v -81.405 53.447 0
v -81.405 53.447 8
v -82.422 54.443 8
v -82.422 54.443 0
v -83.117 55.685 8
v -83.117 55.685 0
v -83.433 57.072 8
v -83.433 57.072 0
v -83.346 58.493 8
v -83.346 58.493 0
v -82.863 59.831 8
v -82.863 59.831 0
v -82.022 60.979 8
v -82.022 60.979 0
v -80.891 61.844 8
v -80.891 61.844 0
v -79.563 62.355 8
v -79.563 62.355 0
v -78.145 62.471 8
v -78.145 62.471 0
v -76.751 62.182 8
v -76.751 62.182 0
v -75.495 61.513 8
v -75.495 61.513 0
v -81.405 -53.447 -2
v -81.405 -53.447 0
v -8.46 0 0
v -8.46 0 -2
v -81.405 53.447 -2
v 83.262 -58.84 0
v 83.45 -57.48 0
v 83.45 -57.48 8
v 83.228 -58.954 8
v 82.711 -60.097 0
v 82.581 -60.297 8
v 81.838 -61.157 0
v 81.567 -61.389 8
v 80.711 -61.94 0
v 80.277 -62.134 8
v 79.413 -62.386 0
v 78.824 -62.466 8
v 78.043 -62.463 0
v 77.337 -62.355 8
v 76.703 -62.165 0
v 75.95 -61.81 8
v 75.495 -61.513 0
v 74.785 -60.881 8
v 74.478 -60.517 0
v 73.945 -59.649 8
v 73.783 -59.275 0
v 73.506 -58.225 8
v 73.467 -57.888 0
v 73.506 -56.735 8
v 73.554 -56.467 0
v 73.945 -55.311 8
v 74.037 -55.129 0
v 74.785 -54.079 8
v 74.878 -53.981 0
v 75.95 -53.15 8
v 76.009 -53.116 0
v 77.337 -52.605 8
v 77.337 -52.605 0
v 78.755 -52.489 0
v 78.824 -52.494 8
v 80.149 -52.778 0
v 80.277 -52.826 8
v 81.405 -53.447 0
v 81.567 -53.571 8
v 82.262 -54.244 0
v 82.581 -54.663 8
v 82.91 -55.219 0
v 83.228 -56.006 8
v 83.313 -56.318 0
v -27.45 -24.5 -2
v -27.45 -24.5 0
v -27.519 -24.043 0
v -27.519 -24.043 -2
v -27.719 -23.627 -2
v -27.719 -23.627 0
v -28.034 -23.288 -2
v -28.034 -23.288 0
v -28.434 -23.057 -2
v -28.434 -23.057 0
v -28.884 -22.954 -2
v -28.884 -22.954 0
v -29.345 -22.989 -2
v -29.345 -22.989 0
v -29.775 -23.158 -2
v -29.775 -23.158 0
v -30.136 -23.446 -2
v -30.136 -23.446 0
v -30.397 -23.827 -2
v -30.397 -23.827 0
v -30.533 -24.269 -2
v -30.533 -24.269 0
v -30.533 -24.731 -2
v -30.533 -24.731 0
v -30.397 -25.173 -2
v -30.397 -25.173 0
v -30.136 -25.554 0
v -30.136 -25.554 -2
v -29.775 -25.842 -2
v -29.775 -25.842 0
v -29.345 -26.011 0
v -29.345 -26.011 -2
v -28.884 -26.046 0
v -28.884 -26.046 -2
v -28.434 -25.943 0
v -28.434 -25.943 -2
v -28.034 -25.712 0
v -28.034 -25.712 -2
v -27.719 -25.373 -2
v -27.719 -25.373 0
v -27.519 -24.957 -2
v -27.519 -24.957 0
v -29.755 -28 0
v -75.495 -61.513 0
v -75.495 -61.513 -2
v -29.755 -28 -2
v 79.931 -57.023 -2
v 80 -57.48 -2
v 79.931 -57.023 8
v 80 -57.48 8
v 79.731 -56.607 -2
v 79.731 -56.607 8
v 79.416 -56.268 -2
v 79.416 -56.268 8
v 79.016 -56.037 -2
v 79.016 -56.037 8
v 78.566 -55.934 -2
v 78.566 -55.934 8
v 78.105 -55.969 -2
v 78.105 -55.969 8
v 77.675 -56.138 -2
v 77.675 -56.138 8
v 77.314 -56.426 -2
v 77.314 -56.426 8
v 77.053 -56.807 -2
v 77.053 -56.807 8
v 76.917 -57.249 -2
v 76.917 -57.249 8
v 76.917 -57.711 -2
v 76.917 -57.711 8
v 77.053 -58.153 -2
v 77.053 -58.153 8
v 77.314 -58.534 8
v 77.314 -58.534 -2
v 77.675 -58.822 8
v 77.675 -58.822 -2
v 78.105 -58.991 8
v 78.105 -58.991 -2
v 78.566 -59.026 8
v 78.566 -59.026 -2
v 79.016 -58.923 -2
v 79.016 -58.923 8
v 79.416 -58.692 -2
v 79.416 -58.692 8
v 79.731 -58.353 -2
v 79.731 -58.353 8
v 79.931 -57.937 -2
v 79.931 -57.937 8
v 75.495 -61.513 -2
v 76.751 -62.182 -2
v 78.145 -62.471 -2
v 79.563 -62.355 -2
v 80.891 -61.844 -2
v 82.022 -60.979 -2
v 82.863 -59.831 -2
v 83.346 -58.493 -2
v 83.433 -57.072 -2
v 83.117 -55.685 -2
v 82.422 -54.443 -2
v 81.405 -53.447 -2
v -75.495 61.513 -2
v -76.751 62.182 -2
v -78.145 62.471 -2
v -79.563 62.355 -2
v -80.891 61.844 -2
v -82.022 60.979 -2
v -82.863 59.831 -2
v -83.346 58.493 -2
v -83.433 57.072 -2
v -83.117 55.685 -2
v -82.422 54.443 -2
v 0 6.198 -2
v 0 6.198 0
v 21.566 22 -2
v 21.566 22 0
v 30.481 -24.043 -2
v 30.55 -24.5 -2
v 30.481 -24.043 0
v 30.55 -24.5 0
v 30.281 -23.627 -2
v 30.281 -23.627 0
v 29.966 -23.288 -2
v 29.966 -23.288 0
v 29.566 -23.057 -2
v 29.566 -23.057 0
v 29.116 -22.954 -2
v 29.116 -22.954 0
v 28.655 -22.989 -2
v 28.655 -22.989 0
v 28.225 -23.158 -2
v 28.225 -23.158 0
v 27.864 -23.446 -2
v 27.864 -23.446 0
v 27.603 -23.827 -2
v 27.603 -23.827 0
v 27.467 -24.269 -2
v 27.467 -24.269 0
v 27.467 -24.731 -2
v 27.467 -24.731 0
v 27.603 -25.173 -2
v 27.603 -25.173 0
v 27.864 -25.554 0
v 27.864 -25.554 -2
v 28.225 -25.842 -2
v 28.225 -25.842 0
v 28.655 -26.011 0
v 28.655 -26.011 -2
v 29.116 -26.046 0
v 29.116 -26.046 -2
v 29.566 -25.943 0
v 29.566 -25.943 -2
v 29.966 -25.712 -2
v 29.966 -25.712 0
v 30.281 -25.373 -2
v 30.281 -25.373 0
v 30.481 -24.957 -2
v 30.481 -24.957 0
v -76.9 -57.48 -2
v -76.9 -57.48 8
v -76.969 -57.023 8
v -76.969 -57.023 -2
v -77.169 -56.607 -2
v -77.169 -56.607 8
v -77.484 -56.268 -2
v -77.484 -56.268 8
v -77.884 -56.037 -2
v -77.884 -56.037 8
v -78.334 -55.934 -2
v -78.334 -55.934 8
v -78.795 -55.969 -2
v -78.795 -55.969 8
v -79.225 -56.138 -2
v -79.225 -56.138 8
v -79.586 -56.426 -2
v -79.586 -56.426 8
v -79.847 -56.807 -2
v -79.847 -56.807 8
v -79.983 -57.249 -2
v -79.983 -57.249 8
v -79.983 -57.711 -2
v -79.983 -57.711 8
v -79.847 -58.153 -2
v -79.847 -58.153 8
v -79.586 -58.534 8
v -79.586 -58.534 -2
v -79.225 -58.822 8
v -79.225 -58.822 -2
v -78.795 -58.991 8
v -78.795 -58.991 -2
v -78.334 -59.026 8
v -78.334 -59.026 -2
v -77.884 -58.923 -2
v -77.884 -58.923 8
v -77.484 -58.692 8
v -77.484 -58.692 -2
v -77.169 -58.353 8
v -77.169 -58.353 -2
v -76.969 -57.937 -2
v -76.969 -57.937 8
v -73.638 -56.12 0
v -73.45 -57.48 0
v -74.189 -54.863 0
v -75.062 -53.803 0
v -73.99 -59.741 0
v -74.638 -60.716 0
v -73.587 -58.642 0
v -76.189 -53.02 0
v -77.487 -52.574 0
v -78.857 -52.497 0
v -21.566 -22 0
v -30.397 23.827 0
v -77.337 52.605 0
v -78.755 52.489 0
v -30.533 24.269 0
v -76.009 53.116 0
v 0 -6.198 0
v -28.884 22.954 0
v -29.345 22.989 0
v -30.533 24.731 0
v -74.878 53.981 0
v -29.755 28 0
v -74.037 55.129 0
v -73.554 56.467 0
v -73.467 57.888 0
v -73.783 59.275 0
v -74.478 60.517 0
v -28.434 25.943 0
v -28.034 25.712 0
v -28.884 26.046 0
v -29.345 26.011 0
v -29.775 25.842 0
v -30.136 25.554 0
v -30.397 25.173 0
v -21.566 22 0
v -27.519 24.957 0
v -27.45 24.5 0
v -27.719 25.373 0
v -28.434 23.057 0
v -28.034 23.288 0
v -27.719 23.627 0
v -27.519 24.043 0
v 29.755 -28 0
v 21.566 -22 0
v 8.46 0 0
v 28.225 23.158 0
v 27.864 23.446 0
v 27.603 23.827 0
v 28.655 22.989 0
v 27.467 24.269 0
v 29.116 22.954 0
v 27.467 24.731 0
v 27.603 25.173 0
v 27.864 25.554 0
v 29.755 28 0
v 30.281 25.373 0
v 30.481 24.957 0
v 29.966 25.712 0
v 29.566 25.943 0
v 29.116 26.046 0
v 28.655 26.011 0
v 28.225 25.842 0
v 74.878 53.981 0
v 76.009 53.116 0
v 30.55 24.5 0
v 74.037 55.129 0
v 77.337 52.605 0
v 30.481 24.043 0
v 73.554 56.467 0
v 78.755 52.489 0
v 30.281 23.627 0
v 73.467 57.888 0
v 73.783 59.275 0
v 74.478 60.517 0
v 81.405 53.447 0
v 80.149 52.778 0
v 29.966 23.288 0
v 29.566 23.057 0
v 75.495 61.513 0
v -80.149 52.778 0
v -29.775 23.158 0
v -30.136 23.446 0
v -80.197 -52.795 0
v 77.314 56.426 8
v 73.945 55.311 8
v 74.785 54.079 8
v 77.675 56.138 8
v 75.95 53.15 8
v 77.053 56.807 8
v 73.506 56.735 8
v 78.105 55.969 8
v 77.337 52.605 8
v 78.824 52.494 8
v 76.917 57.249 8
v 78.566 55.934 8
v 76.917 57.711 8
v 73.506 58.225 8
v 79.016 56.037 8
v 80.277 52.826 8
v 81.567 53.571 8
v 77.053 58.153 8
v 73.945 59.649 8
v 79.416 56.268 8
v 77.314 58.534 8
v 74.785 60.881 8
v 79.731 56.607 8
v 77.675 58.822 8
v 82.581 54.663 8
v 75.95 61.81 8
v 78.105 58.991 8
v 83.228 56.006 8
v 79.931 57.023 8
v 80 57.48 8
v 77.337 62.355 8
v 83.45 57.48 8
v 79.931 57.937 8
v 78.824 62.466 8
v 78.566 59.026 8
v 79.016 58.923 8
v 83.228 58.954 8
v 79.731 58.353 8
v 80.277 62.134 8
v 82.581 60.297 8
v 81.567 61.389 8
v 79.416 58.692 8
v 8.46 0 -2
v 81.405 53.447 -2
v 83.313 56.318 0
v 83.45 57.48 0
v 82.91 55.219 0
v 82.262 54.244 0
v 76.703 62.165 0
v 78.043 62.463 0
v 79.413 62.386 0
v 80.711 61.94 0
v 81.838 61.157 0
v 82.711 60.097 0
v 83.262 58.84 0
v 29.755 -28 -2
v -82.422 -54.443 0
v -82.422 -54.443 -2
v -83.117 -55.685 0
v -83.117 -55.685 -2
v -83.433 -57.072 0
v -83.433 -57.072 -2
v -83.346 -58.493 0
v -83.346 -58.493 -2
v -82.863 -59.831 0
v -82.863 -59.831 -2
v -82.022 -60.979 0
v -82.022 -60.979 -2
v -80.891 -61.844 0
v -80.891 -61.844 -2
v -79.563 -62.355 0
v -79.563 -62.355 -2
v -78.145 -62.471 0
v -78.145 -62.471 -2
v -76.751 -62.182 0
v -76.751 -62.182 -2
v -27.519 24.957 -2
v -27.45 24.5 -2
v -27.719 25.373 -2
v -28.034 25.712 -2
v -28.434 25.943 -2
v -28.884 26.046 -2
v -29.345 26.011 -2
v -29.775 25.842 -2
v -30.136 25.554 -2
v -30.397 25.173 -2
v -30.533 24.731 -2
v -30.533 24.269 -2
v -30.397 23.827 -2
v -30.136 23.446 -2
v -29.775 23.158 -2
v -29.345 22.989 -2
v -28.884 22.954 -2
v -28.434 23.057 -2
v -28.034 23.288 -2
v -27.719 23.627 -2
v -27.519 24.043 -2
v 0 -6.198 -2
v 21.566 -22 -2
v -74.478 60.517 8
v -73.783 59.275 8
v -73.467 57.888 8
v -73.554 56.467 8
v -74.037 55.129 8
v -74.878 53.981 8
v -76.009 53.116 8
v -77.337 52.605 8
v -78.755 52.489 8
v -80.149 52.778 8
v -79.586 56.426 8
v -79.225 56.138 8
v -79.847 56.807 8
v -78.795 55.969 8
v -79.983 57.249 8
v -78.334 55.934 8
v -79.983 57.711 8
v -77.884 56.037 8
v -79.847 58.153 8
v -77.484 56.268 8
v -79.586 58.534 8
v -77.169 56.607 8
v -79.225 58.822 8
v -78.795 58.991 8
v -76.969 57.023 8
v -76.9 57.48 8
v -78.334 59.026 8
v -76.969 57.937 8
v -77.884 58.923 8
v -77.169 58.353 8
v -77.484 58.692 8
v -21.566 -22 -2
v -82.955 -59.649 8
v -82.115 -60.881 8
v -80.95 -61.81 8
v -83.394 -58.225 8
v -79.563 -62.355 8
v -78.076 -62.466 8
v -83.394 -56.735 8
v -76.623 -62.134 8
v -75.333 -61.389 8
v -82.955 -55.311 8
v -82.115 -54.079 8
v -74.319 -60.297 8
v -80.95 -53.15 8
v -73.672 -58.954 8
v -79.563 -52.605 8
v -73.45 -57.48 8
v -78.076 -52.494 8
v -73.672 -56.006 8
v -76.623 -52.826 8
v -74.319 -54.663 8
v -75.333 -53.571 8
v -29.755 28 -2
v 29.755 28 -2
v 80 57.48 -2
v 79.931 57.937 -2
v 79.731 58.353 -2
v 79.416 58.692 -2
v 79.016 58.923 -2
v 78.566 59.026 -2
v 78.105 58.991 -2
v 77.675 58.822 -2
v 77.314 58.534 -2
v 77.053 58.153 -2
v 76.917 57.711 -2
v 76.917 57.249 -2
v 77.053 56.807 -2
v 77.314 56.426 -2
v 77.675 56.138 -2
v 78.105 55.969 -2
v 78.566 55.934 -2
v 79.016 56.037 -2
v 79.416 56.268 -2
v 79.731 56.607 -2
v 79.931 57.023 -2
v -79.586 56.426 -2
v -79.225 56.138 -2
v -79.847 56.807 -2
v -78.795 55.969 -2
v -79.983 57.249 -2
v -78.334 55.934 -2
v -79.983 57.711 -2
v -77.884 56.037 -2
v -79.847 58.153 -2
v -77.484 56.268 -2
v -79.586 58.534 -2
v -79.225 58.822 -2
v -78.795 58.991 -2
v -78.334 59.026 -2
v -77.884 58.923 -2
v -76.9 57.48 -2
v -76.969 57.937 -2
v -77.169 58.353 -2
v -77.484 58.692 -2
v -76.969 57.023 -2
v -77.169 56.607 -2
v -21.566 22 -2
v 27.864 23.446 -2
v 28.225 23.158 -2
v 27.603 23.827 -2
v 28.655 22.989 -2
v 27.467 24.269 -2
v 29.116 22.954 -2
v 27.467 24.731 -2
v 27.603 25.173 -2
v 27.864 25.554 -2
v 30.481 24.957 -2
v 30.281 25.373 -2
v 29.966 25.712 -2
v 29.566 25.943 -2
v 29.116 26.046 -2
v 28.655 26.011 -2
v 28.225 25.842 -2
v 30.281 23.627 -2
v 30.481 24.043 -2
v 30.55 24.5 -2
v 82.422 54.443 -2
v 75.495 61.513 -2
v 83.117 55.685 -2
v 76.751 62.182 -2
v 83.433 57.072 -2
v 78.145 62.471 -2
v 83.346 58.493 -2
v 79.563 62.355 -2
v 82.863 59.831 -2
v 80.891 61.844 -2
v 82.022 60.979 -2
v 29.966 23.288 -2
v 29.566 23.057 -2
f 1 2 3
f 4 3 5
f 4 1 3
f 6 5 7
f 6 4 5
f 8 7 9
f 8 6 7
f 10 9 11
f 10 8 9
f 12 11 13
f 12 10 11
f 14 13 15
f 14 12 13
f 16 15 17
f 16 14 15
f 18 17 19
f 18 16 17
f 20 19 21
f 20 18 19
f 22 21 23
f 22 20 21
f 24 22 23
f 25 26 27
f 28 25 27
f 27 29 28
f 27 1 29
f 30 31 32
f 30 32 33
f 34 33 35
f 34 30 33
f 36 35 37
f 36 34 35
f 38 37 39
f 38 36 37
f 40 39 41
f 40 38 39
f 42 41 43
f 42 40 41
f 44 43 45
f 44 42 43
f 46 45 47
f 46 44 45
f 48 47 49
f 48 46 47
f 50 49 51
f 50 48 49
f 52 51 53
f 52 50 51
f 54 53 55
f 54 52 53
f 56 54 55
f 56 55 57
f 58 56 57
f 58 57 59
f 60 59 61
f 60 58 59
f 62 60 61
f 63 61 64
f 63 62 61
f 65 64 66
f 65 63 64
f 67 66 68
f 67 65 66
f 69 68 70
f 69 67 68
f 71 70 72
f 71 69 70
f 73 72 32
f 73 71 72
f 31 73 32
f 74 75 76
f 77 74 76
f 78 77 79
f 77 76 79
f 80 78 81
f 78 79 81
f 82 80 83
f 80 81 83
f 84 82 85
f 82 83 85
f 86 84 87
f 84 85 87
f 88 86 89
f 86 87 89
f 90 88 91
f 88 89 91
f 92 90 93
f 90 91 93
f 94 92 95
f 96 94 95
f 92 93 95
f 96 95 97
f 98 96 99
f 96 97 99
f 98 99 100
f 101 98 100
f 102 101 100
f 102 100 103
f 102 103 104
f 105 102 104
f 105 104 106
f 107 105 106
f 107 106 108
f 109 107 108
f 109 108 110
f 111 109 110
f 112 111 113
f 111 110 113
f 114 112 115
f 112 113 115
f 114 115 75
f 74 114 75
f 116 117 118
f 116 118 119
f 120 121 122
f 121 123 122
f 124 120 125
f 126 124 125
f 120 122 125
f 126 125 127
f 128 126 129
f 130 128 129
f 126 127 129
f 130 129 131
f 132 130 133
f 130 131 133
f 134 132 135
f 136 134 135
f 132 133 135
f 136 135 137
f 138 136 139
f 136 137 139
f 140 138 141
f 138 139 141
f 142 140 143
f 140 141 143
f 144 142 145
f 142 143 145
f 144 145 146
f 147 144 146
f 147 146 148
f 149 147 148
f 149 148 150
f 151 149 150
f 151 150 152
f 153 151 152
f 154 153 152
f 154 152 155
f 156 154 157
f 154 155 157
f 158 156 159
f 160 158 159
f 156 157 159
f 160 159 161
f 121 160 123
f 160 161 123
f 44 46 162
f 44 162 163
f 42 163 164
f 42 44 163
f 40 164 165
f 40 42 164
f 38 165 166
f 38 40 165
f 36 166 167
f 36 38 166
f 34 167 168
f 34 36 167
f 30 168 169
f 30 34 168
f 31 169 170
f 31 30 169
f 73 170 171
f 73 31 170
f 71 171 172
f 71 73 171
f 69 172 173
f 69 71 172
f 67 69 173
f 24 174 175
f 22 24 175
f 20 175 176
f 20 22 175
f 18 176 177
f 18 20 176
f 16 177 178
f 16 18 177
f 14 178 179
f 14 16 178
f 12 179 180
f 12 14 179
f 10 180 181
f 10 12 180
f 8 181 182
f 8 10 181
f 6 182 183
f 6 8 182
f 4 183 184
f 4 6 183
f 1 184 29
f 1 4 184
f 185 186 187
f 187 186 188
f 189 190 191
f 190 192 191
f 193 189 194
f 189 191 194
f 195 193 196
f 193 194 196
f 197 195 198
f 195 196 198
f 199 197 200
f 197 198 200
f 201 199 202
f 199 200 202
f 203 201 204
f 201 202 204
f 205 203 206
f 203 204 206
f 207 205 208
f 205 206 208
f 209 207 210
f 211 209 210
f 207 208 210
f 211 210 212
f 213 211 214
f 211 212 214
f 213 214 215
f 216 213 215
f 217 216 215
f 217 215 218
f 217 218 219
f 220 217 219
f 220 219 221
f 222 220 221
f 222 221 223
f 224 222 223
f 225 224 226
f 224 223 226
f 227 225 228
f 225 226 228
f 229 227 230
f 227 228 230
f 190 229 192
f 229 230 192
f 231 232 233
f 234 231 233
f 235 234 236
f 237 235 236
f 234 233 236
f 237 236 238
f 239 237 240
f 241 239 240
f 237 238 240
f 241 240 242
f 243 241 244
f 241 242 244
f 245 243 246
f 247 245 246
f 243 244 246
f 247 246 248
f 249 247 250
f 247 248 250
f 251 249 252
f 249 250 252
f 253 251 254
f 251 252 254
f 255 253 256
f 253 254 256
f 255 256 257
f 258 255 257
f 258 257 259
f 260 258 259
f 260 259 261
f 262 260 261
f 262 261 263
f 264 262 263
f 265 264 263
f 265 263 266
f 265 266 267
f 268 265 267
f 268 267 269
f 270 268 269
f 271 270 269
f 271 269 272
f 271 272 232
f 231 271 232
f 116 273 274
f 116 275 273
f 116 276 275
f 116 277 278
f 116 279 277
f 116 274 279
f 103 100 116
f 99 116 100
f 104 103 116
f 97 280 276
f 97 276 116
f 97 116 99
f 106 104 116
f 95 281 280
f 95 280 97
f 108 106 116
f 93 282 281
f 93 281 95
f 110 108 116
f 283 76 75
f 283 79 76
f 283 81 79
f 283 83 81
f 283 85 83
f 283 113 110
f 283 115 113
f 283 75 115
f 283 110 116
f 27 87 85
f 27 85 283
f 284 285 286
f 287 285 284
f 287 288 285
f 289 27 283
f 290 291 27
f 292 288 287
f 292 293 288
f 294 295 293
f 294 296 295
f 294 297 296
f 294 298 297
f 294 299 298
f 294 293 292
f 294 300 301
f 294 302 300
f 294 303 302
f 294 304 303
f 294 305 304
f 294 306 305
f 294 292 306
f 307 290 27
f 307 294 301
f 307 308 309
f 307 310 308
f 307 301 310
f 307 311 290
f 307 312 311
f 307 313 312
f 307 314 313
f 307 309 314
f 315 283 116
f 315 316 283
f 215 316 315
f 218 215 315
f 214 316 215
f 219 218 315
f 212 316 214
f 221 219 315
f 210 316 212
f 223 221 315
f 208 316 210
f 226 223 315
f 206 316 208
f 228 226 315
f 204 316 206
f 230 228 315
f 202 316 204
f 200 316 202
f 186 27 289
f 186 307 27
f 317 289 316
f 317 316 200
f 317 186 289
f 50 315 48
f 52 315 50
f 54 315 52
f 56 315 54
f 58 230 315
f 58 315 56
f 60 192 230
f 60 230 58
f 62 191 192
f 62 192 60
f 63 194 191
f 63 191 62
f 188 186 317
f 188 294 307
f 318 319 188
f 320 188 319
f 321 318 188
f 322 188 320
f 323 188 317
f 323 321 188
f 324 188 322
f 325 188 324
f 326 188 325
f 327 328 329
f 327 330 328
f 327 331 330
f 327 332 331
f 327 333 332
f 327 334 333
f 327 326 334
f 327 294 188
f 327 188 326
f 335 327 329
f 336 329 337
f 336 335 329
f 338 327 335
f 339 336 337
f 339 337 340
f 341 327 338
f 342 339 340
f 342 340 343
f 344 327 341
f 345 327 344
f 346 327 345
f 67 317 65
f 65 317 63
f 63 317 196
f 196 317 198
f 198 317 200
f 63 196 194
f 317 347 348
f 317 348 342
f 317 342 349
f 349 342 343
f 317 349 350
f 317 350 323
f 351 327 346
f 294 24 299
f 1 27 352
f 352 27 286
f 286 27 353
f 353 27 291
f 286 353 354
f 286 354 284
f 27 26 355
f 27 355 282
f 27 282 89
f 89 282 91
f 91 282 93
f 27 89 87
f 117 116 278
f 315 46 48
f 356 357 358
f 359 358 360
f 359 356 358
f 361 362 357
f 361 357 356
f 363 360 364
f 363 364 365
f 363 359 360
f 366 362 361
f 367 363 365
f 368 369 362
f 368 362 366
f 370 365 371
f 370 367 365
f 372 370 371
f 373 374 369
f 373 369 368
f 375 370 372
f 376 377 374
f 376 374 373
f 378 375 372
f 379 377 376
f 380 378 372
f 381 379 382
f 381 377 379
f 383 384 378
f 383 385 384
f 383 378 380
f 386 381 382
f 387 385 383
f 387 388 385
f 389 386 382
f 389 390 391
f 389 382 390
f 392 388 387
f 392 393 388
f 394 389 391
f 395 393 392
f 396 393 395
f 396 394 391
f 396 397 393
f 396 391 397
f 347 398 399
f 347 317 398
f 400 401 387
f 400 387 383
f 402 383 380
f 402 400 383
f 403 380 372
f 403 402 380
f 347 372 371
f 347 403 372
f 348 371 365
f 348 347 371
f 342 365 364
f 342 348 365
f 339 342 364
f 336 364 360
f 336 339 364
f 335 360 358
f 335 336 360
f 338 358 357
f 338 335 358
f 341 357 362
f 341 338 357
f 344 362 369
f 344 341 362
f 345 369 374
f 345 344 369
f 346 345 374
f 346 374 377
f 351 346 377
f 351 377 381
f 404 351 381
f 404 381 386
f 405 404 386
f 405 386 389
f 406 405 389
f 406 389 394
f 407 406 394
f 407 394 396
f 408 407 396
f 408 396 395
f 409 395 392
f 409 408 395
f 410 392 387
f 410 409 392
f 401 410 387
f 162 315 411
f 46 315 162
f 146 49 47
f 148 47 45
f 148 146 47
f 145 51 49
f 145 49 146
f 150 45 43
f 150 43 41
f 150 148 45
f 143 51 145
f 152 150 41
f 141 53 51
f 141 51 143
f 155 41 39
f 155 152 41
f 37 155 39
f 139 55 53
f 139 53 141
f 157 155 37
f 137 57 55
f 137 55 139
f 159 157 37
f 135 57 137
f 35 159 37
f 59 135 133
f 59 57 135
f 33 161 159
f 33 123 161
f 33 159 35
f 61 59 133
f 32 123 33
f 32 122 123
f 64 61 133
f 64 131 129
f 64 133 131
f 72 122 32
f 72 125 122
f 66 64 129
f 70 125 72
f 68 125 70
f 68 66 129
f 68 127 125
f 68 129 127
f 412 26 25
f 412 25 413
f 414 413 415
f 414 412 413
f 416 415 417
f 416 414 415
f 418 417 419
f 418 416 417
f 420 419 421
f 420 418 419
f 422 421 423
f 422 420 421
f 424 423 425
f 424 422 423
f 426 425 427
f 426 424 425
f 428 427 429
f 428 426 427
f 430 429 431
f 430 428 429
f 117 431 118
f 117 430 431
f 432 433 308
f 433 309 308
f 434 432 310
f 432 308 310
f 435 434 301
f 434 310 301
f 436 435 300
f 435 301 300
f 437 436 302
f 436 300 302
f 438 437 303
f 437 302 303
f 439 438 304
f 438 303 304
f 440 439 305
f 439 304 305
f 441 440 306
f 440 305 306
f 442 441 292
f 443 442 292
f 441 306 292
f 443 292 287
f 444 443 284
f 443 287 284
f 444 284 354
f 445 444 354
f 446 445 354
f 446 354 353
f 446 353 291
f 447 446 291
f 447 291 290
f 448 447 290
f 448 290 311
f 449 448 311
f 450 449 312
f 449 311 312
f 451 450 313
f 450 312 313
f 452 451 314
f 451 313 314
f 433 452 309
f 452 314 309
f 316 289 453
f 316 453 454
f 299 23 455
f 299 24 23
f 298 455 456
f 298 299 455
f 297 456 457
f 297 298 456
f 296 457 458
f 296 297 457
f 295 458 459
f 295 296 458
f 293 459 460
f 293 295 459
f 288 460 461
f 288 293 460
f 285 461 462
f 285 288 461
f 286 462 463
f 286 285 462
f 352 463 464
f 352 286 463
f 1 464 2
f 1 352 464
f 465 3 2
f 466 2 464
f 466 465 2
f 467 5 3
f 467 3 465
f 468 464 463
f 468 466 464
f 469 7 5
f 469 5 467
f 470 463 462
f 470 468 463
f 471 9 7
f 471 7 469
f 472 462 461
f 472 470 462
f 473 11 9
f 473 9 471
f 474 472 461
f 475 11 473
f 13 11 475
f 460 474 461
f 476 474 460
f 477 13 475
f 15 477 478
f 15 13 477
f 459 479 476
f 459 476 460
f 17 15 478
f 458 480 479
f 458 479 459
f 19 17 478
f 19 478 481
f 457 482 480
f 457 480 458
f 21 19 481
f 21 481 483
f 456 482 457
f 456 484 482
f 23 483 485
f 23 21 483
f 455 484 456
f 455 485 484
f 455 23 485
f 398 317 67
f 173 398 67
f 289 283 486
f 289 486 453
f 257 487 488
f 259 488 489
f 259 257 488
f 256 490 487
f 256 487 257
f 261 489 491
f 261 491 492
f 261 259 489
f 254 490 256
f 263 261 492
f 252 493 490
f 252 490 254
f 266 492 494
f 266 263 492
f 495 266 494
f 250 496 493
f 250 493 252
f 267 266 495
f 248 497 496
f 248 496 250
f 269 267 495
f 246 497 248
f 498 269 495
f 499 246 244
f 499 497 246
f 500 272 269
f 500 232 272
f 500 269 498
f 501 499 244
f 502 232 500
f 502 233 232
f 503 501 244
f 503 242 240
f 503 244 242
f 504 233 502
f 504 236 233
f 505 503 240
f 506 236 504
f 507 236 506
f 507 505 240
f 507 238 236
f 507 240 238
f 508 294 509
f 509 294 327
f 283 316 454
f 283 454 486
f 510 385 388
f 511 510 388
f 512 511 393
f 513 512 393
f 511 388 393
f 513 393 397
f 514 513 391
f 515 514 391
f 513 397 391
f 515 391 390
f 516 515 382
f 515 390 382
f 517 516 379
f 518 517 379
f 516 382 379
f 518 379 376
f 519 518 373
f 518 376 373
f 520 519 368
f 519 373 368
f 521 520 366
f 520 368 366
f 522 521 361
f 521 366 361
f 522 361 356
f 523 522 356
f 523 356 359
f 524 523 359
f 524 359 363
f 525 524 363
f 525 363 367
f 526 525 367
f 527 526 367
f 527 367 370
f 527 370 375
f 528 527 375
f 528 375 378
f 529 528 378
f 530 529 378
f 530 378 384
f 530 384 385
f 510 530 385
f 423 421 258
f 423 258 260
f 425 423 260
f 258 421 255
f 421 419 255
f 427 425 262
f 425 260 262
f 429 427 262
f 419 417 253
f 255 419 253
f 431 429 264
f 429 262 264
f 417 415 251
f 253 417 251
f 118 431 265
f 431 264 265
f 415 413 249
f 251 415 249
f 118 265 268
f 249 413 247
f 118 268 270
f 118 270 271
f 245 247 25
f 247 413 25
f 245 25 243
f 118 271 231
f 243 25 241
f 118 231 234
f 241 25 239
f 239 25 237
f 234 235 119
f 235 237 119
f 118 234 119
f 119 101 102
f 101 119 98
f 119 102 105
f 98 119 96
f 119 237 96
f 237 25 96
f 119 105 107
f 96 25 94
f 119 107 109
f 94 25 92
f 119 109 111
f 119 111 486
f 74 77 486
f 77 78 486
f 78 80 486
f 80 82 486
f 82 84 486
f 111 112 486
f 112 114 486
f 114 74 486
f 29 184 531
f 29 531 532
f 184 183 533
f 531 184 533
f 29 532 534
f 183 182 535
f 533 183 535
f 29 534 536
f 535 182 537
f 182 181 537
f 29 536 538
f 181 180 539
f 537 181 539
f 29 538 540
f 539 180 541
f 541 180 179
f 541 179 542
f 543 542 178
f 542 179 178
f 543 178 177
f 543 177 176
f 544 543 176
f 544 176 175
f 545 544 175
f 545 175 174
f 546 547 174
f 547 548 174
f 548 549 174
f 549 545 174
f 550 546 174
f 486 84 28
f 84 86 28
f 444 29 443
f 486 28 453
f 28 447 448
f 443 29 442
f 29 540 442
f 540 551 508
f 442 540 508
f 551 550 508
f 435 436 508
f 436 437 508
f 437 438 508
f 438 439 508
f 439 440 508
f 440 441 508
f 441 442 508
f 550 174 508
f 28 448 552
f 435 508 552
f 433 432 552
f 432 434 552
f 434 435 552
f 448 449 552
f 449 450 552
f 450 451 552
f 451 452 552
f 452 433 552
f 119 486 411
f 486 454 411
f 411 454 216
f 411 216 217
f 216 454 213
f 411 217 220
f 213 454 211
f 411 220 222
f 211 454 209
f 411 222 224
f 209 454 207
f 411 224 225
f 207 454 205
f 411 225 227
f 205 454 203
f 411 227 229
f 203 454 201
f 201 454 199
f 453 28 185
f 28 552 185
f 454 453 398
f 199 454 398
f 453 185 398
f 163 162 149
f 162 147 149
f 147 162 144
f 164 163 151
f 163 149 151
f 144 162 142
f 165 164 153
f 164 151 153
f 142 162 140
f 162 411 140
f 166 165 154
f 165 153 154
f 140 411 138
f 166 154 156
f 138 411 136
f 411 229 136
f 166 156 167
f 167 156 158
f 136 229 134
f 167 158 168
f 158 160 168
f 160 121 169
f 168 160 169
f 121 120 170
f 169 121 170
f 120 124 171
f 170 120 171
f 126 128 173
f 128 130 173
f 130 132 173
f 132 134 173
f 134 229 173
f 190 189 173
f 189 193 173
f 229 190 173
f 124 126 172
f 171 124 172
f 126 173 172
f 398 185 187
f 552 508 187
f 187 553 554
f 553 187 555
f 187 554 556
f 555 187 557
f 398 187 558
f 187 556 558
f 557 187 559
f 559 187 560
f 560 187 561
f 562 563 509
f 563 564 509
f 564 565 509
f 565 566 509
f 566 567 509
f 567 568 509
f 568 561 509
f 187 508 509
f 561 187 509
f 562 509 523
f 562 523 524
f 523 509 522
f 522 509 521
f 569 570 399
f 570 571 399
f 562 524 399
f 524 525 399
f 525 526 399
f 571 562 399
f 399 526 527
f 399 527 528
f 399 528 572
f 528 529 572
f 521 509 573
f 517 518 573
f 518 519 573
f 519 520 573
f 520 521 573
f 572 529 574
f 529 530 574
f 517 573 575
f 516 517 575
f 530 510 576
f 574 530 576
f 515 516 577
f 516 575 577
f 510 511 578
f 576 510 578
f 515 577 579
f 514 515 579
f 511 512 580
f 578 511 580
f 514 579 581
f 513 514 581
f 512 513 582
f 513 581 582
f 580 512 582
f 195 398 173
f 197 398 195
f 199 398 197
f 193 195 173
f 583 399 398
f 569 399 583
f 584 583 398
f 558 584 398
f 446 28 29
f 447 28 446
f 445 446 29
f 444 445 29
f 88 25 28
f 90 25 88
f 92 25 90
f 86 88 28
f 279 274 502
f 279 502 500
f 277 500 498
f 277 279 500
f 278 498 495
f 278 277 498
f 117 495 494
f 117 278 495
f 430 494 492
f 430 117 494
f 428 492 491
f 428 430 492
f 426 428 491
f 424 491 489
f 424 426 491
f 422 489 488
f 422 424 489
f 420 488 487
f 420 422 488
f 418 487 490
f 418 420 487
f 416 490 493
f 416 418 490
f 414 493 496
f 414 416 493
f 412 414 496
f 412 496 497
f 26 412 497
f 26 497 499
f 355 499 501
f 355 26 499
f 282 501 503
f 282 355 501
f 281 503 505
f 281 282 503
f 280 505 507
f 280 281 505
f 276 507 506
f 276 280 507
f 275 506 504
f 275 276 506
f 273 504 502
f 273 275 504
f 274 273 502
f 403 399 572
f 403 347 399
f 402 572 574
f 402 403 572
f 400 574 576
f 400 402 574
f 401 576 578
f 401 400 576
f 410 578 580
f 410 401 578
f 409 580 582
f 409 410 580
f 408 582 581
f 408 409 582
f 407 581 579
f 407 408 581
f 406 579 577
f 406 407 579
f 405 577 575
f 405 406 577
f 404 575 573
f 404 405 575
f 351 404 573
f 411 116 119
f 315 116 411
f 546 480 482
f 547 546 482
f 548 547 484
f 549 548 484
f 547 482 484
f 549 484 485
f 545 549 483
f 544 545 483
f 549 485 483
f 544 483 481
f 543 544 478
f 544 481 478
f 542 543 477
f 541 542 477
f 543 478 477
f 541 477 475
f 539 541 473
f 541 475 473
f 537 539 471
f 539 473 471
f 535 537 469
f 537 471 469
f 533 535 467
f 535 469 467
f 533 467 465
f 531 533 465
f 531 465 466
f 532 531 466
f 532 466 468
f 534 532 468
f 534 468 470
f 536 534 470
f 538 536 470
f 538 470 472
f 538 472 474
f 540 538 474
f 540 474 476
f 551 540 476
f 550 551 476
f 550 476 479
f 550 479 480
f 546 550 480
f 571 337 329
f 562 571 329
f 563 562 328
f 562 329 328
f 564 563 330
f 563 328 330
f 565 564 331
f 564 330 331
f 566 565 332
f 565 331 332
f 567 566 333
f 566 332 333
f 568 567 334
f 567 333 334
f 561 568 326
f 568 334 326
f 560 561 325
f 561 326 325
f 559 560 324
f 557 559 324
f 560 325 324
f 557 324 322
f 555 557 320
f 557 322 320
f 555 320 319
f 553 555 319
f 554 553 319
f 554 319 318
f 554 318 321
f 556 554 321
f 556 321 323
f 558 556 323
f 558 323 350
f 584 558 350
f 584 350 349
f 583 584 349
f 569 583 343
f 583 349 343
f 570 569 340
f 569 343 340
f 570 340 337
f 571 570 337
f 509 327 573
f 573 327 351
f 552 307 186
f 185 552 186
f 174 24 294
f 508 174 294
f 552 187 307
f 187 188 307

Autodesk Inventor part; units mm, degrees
ref_plane "YZ Plane" through (0, 0, 0) normal (1, 0, 0) x (0, 1, 0)
ref_plane "XZ Plane" through (0, 0, 0) normal (0, 1, 0) x (-1, 0, 0)
ref_plane "XY Plane" through (0, 0, 0) normal (0, 0, 1) x (1, 0, 0)
sketch "Sketch1" plane through (0, 0, 0) normal (0, 0, 1) x (1, 0, 0)
  line L0 (92.45, -67.135) -> (-92.45, -67.135) construction
  line L1 (-92.45, -67.135) -> (-92.45, 67.135) construction
  line L2 (-92.45, 67.135) -> (92.45, 67.135) construction
  line L3 (92.45, 67.135) -> (92.45, -67.135) construction
  line L4 (92.45, -67.135) -> (-92.45, 67.135) construction
  line L5 (-92.45, -67.135) -> (92.45, 67.135) construction
  line L6 (77.45, -40.52) -> (-78.55, -40.52) construction
  line L7 (-78.55, -40.52) -> (-78.55, 48.48) construction
  line L8 (-78.55, 48.48) -> (77.45, 48.48) construction
  line L9 (77.45, 48.48) -> (77.45, -40.52) construction
  circle A0 centre (-78.45, 57.48) radius 1.5 construction
  circle A1 centre (-78.45, -57.48) radius 1.5 construction
  line L10 (0, 87.0056) -> (0, -123.2523) construction
  circle A2 centre (78.45, 57.48) radius 1.5 construction
  circle A3 centre (78.45, -57.48) radius 1.5 construction
  line L11 (-78.45, 57.48) -> (78.45, 57.48) construction
  line L12 (-78.45, 57.48) -> (-78.45, 67.135) construction
  line L13 (-78.45, -57.48) -> (-78.45, -67.135) construction
  circle A4 centre (-78.45, 57.48) radius 5
  circle A5 centre (78.45, 57.48) radius 5
  line L14 (-92.45, 0) -> (92.45, 0) construction
  circle A6 centre (-78.45, -57.48) radius 5
  circle A7 centre (78.45, -57.48) radius 5
  line L15 (-81.4051, 53.4467) -> (75.4949, -61.5133)
  line L16 (-75.4949, 61.5133) -> (81.4051, -53.4467)
  line L17 (-75.4949, -61.5133) -> (81.4051, 53.4467)
  line L18 (-81.4051, -53.4467) -> (75.4949, 61.5133)
  point P0 (0, 0)
  point P1 (0, 67.135)
  point P2 (-78.55, 3.98)
  point P3 (0, 57.48)
  dimension "d0" = 184.9
  dimension "d1" = 134.27
  dimension "d2" = 156
  dimension "d3" = 89
  dimension "d4" = 114.96
  dimension "d5" = 3
  dimension "d6" = 156.9
  dimension "d7" = 9
  dimension "d17" = 15
  dimension "d18" = 13.9
  dimension "d19" = 10
extrude "Extrusion3" add sketch "Sketch1" against normal blind 2
sketch "Sketch3" plane through (0, 0, 0) normal (0, 0, 1) x (1, 0, 0)
  circle A0 centre (-78.45, 57.48) radius 5
  line L0 (0, 65.2064) -> (0, -49.8474) construction
  line L1 (-74.1059, 0) -> (81.0801, 0) construction
  arc A1 (-75.4949, 61.5133) -> (-81.4051, 53.4467) centre (-78.45, 57.48) ccw projected
  circle A2 centre (78.45, 57.48) radius 5
  circle A3 centre (-78.45, -57.48) radius 5
  circle A4 centre (78.45, -57.48) radius 5
  point P0 (0, 0)
extrude "Extrusion4" add sketch "Sketch3" along normal blind 8
sketch "Sketch4" plane through (-78.45, -57.48, 8) normal (0, 0, 1) x (1, 0, 0)
  circle A0 centre (0, 0) radius 1.55
  line L0 (-9.7734, 57.48) -> (187.2333, 57.48) construction
  line L1 (78.45, 128.3827) -> (78.45, -12.8511) construction
  circle A1 centre (156.9, 0) radius 1.55
  circle A2 centre (0, 114.96) radius 1.55
  circle A3 centre (156.9, 114.96) radius 1.55
  circle A4 centre (0, 0) radius 5 construction
  point P0 (78.45, 57.48)
  dimension "d24" = 3.1
extrude "Extrusion5" cut sketch "Sketch4" against normal up to next
sketch "Sketch5" plane through (0, 0, 0) normal (0, 0, 1) x (1, 0, 0)
  line L0 (-29, -24.5) -> (29, -24.5) construction
  line L1 (29, -24.5) -> (29, 24.5) construction
  line L2 (29, 24.5) -> (-29, 24.5) construction
  line L3 (-29, 24.5) -> (-29, -24.5) construction
  line L4 (-29, -24.5) -> (29, 24.5) construction
  line L5 (29, -24.5) -> (-29, 24.5) construction
  circle A0 centre (29, 24.5) radius 1.55
  line L6 (0, 47.6291) -> (0, -68.5673) construction
  line L7 (-80.197, 0) -> (59.821, 0) construction
  circle A1 centre (-29, 24.5) radius 1.55
  line L8 (29, -24.5) -> (-29, -24.5) construction
  circle A2 centre (29, -24.5) radius 1.55
  circle A3 centre (-29, -24.5) radius 1.55
  line L9 (0, 6.1985) -> (-75.4949, 61.5133) projected
  line L10 (-29.7552, 28) -> (29.7552, 28)
  line L11 (21.5663, 22) -> (-21.5663, 22)
  line L12 (75.4949, 61.5133) -> (0, 6.1985) projected
  line L13 (-29.7552, -28) -> (29.7552, -28)
  line L14 (21.5663, -22) -> (-21.5663, -22)
  line L15 (-29.7552, -28) -> (-21.5663, -22)
  line L16 (0, -6.1985) -> (-75.4949, -61.5133) projected
  line L17 (21.5663, -22) -> (29.7552, -28)
  line L18 (75.4949, -61.5133) -> (0, -6.1985) projected
  point P0 (0, 0)
  dimension "d27" = 58
  dimension "d28" = 49
  dimension "d29" = 3.1
  dimension "d30" = 6
  dimension "d31" = 2.5
extrude "Extrusion6" add sketch "Sketch5" against normal up to surface (2 mm away) contours L9 L10 L12 L11 | L15 L14 L17 L13
extrude "Extrusion7" cut sketch "Sketch5" against normal up to next contours A0 | A1 | A2 | A3
properties part number "LCDv5-backCover"
